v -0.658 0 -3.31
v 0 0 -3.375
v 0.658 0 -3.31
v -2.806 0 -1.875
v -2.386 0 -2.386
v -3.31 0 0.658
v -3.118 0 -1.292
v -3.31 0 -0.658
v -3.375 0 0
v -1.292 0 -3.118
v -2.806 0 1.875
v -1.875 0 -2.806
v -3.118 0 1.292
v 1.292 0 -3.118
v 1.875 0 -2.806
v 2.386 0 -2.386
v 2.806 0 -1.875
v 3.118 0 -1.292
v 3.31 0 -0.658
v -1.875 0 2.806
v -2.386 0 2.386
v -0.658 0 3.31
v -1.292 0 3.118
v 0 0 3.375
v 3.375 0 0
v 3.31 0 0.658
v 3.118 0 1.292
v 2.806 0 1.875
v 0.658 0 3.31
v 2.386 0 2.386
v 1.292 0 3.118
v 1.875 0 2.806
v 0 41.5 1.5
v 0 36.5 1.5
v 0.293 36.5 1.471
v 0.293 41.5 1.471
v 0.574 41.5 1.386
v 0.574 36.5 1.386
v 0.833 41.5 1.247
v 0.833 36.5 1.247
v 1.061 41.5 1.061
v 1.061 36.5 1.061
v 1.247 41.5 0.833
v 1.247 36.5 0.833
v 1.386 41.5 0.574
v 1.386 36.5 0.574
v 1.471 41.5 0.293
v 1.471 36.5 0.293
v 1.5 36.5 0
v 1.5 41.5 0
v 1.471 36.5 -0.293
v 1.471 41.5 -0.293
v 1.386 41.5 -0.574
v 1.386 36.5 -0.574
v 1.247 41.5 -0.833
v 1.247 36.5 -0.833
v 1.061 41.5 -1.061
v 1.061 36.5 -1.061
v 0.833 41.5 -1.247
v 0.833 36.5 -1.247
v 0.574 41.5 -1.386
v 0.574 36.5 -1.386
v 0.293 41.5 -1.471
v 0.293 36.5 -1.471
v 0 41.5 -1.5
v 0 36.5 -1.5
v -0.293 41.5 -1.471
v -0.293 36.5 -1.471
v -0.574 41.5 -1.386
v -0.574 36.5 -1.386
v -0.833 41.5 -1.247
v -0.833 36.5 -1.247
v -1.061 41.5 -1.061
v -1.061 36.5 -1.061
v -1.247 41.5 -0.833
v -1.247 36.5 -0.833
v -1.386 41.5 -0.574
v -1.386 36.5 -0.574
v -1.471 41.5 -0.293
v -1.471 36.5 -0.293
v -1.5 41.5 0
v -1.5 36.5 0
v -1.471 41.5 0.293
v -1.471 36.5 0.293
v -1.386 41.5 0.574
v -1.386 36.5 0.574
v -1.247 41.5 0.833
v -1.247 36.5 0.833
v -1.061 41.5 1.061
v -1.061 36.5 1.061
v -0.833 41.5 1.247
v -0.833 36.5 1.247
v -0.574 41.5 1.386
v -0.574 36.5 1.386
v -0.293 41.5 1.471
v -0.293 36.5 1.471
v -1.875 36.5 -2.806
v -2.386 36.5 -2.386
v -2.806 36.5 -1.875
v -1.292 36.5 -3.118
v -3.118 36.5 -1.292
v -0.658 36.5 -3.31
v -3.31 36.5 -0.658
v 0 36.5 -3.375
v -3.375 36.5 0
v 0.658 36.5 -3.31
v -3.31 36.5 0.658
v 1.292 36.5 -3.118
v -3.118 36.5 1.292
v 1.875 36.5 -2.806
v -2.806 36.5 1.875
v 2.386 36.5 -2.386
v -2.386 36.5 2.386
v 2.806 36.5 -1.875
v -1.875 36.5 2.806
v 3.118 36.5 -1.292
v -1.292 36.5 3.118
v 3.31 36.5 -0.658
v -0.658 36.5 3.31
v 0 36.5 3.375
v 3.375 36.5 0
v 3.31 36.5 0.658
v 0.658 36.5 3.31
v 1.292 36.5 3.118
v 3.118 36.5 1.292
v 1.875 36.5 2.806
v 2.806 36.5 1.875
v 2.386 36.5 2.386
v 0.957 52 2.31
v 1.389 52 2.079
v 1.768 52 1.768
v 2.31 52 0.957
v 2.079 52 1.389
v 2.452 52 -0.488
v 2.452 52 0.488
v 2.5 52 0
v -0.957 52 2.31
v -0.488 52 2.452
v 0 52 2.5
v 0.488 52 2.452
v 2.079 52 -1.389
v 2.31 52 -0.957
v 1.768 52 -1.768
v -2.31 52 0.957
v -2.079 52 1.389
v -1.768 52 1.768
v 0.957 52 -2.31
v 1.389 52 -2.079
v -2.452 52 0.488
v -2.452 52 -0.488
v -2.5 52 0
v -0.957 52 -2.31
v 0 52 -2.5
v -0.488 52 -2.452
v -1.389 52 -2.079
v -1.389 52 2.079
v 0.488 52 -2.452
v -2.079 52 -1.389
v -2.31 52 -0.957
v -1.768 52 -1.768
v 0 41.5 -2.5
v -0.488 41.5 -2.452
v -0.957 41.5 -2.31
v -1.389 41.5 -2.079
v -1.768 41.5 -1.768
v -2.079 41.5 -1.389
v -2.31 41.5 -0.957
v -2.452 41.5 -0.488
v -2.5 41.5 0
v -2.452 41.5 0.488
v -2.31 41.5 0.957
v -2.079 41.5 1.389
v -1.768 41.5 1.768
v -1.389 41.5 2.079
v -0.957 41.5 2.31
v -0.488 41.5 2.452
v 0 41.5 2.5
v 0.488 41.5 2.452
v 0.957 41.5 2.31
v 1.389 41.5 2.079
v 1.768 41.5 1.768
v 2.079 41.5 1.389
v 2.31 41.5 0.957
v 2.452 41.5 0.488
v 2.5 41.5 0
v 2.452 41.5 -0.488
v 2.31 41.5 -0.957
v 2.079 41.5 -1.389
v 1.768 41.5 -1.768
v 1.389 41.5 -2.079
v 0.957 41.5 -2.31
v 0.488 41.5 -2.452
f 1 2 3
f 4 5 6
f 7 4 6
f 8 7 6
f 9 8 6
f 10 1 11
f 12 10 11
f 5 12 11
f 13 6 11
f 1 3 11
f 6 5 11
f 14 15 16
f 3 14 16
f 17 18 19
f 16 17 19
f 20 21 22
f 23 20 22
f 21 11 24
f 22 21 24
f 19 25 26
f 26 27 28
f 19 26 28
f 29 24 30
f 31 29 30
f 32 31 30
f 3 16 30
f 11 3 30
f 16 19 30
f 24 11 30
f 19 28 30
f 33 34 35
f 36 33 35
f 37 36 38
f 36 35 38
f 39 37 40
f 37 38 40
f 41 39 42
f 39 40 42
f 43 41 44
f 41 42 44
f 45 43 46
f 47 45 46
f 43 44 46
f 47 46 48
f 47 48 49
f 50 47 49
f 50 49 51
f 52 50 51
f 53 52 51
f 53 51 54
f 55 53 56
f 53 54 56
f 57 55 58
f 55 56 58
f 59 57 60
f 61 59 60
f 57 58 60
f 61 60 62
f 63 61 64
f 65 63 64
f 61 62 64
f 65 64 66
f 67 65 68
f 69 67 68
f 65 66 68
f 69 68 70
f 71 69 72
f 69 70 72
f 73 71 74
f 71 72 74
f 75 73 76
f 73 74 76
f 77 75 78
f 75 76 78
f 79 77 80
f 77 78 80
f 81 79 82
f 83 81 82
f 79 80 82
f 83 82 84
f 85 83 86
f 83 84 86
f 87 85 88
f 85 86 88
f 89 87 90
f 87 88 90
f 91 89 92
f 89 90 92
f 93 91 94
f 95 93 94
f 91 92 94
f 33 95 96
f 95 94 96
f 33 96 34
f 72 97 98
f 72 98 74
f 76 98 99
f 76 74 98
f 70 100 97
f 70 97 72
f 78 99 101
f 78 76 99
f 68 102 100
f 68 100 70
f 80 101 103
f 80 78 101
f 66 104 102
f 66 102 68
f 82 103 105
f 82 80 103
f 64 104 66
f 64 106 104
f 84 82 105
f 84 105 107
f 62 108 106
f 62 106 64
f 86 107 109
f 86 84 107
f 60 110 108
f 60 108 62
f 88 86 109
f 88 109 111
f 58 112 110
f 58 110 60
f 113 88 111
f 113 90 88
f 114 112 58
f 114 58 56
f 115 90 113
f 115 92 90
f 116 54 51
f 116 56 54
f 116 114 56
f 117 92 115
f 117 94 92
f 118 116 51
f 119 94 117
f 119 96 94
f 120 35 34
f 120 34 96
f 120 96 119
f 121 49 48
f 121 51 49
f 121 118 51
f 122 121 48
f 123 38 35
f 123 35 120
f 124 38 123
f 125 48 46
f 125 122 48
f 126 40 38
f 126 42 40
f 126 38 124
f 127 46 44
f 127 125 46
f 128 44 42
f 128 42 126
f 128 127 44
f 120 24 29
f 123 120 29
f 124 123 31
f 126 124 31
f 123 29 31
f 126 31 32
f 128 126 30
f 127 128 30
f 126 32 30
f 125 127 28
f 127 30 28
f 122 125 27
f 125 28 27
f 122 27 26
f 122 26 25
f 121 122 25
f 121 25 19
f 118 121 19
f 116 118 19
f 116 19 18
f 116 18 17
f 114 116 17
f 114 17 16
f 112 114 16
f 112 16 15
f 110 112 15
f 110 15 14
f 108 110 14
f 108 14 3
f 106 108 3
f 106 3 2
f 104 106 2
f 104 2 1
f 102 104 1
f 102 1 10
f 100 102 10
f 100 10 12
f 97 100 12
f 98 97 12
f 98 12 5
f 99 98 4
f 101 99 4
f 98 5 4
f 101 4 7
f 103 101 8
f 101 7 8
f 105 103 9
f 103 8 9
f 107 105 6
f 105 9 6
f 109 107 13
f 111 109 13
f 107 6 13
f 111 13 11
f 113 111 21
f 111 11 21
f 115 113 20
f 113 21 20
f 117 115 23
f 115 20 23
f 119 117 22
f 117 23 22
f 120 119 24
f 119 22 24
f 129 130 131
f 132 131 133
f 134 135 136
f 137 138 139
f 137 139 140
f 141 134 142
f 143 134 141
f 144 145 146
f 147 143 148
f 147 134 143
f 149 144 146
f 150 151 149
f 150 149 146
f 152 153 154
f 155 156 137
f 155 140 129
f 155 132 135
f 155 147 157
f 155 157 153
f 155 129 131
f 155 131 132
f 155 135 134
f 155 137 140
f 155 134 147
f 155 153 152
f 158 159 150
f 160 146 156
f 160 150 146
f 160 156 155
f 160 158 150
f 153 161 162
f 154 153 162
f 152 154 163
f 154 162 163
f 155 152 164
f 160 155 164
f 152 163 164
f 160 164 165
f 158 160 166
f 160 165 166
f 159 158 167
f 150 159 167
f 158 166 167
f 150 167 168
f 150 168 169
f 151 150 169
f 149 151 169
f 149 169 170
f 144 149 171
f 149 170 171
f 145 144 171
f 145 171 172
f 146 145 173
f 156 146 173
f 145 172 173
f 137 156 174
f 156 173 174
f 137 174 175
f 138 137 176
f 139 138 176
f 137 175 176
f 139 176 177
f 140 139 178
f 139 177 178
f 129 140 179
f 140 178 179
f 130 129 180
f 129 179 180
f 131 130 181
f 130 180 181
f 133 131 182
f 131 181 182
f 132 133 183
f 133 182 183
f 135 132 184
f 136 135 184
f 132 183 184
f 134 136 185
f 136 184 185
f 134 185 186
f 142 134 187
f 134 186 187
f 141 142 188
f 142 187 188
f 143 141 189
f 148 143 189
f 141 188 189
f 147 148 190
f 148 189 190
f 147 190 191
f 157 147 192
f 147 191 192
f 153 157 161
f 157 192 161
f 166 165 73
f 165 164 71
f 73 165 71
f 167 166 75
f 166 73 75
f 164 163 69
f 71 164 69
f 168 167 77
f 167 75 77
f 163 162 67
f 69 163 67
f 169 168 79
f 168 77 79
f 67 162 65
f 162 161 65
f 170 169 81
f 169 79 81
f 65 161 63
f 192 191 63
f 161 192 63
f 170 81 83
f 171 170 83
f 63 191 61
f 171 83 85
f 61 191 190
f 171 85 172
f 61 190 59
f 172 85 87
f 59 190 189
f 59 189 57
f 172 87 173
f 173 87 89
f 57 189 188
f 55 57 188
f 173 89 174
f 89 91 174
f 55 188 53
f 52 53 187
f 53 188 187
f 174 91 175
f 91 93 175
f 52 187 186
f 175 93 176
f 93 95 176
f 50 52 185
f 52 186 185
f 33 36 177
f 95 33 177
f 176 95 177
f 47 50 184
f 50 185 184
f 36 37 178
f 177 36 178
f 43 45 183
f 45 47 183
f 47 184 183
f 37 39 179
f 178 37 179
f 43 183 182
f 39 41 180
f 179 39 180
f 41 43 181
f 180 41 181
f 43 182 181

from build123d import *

# Parameters (mm, degrees)
SKETCH1_R           = 3.375
BOSS_EXTRUDE1_DEPTH = 41.5
SKETCH2_R           = 2.5
BOSS_EXTRUDE2_DEPTH = 10.5
CUT_EXTRUDE1_START  = -5
SKETCH3_R           = 3.375
SKETCH3_R_2         = 1.5
CUT_EXTRUDE1_DEPTH  = 5


with BuildPart() as part:
    # Sketch1 → Boss-Extrude1 (new body)
    with BuildSketch(Plane(origin=(0, 0, 0), x_dir=(1, 0, 0), z_dir=(0, 1, 0))):
        with Locations(Location((0, 0, 0), (0, 0, 270))):
            Circle(SKETCH1_R)
    extrude(amount=BOSS_EXTRUDE1_DEPTH)

    # Sketch2 → Boss-Extrude2 (add)
    with BuildSketch(Plane(origin=(0, 41.5, 0), x_dir=(1, 0, 0), z_dir=(0, 1, 0))):
        with Locations(Location((0, 0, 0), (0, 0, 90))):
            Circle(SKETCH2_R)
    extrude(amount=BOSS_EXTRUDE2_DEPTH)

    # Sketch3 → Cut-Extrude1 (cut)
    with BuildSketch(Plane(origin=(0, 41.5, 0), x_dir=(1, 0, 0), z_dir=(0, 1, 0)).offset(CUT_EXTRUDE1_START)):
        with Locations(Location((0, 0, 0), (0, 0, 270))):
            Circle(SKETCH3_R)
        with Locations(Location((0, 0, 0), (0, 0, 270))):
            Circle(SKETCH3_R_2, mode=Mode.SUBTRACT)
    extrude(amount=CUT_EXTRUDE1_DEPTH, mode=Mode.SUBTRACT)


solid = part.part
